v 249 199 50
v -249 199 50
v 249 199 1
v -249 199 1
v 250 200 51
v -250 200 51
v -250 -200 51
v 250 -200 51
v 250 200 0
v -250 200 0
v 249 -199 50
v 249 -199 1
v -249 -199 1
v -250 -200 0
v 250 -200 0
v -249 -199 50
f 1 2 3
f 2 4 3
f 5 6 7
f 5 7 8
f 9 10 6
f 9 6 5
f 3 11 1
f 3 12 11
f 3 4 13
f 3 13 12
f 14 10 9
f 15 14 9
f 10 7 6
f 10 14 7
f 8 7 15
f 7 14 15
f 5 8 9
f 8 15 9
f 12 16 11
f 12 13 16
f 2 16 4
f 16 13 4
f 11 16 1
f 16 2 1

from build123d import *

# Parameters (mm, degrees)
F0_W     = 500
F0_H     = 400
F1_DEPTH = 50
F2_T     = -1
F4_W     = 500
F4_H     = 400
F5_DEPTH = 1


with BuildPart() as f1:
    # F0 (on Top) → F1 (new body)
    with BuildSketch(Plane.XY):
        Rectangle(F0_W, F0_H)
    extrude(amount=F1_DEPTH)

    # F2
    f2_openings = [f1.faces().sort_by_distance(p)[0] for p in [
        (0, 0, 50),
    ]]
    offset(amount=F2_T, openings=f2_openings)

    # F4 (on offset) → F5 (join)
    with BuildSketch(Plane.XY.offset(50)):
        Rectangle(F4_W, F4_H)
    extrude(amount=F5_DEPTH)


solid = f1.part
